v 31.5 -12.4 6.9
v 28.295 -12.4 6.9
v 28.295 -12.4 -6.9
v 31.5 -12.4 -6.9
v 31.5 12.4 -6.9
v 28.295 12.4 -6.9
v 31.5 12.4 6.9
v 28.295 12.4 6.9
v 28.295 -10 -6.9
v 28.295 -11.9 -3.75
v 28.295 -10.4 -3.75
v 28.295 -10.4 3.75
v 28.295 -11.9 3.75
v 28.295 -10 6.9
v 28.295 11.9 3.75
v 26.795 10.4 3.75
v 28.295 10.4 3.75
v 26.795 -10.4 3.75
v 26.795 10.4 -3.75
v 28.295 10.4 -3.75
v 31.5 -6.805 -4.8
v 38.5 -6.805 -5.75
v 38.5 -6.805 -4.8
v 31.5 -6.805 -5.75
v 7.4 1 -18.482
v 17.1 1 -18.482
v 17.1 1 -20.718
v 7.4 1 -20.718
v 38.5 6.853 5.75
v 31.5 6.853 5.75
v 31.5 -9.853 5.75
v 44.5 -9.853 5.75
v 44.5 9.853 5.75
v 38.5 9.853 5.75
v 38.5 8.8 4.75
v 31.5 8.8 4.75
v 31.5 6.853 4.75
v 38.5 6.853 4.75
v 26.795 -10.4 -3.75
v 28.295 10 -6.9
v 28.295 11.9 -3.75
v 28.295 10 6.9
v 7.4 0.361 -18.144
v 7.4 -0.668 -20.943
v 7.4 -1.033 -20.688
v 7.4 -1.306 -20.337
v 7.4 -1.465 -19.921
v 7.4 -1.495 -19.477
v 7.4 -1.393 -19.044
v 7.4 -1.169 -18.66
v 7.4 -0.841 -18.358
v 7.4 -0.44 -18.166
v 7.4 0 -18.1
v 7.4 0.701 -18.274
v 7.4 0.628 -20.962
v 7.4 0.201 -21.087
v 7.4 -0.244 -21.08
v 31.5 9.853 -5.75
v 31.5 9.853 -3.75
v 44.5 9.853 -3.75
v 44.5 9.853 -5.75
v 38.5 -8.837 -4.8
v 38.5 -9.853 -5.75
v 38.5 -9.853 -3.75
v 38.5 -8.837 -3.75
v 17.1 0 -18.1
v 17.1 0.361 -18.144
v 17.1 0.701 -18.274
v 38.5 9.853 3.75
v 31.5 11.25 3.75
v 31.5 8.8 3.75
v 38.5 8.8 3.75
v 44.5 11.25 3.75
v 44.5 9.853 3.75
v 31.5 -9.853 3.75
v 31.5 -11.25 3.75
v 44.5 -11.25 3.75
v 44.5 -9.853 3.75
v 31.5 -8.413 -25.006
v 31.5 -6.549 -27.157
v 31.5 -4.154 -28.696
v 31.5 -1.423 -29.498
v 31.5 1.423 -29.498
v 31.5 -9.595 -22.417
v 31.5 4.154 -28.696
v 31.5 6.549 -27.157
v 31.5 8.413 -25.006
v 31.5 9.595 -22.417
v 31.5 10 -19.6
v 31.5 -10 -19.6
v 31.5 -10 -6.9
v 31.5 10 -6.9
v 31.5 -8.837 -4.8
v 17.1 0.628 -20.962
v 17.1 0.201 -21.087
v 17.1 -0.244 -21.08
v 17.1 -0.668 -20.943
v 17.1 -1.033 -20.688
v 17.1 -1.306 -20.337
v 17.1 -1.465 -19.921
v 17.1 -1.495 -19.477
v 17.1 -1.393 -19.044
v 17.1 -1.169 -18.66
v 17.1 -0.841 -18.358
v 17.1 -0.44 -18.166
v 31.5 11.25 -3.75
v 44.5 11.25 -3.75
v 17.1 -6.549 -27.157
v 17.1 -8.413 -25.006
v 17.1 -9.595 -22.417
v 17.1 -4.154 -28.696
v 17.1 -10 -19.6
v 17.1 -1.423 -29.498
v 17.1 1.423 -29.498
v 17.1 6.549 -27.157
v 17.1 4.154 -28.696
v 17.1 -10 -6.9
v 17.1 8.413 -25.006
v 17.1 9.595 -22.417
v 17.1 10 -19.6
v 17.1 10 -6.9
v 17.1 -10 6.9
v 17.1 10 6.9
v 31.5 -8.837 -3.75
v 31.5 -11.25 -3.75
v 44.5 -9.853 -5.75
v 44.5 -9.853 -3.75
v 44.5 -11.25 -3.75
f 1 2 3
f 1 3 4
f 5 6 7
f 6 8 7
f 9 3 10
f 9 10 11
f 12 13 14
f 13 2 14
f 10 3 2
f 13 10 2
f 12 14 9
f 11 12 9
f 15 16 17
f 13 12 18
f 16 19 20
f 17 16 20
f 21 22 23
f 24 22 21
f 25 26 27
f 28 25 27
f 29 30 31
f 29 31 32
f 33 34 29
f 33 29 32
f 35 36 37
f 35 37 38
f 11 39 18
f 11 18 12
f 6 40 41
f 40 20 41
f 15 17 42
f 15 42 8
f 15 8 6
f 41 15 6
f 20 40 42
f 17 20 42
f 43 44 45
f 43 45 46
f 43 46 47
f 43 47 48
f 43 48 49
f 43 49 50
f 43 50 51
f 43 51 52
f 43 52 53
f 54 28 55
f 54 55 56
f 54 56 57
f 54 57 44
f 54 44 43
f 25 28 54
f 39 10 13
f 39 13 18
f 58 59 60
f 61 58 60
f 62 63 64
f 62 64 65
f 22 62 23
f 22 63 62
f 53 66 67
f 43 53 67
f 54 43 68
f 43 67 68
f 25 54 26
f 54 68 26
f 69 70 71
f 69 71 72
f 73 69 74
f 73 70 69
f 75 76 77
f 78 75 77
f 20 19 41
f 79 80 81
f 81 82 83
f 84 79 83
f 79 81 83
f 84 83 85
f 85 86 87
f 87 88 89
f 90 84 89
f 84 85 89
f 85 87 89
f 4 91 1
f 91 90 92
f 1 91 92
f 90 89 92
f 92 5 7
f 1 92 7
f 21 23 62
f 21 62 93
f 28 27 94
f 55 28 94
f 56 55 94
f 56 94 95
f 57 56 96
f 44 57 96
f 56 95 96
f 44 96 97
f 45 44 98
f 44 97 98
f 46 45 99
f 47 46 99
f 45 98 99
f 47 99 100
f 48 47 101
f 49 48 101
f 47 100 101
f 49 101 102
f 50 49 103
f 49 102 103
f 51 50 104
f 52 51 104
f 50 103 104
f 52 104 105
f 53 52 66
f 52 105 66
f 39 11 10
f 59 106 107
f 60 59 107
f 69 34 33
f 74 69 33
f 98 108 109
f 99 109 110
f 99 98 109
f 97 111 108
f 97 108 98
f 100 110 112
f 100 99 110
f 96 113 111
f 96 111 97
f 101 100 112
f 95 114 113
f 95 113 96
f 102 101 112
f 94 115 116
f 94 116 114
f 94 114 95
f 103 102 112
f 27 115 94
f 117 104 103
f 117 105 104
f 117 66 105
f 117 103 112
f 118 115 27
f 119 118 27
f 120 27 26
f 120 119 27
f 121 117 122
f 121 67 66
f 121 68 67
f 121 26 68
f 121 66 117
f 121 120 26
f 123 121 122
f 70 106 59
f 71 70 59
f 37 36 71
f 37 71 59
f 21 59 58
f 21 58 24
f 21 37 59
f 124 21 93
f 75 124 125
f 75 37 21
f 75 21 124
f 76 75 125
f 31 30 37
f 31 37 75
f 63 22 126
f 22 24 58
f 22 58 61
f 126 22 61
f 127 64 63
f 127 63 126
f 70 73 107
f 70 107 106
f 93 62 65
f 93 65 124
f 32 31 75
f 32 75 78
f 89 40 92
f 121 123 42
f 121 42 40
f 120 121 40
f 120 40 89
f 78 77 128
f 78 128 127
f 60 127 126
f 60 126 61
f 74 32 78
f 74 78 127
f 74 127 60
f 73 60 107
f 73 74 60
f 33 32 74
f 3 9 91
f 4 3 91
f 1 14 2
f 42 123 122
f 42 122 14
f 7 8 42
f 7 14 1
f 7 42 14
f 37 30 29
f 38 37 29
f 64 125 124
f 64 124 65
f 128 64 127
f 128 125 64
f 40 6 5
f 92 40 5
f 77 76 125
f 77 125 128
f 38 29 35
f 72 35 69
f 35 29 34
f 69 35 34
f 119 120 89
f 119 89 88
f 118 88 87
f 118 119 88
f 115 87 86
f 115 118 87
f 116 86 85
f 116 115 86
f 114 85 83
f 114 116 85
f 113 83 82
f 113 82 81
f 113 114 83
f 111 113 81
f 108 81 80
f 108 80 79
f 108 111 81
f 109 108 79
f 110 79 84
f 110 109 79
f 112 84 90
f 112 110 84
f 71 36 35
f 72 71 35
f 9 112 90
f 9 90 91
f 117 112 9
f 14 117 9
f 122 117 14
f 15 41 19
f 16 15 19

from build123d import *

# Parameters (mm, degrees)
SKETCH1_R           = 10
SKETCH1_W           = 31.5
SKETCH1_H           = 20
SKETCH1_W_2         = 3.204542896
SKETCH1_H_2         = 24.8
BOSS_EXTRUDE1_DEPTH = 6.9
BOSS_EXTRUDE2_DEPTH = 5.75
BOSS_EXTRUDE3_DEPTH = 9.7
SKETCH3_W           = 13
SKETCH3_H           = 1.999999936
SKETCH3_H_2         = 2.000000064
CUT_EXTRUDE1_DEPTH  = 1.397
SKETCH4_W           = 7.0000114
SKETCH4_H           = 1.016
CUT_EXTRUDE2_DEPTH  = 2.000000064
SKETCH6_W           = 7
SKETCH6_H           = 1.947
CUT_EXTRUDE4_DEPTH  = 1
SKETCH4_3_W         = 7.0000114
SKETCH4_3_H         = 2.032
CUT_EXTRUDE3_DEPTH  = 0.95
SKETCH6_3_W         = 7
SKETCH6_3_H         = 1.053
CUT_EXTRUDE5_DEPTH  = 1.999999936
BOSS_EXTRUDE4_START = -3.75
BOSS_EXTRUDE4_DEPTH = 7.5
SKETCH9_W           = 36.585233059
SKETCH9_H           = 32.734155895
CUT_EXTRUDE6_DEPTH  = 53.512569924
SKETCH10_R          = 10
BOSS_EXTRUDE5_DEPTH = 14.400000064
BOSS_EXTRUDE6_DEPTH = 9.7


with BuildPart() as part:
    # Sketch1 → Boss-Extrude1 (new, symmetric)
    with BuildSketch(Plane.XY):
        Circle(SKETCH1_R)
        with Locations((15.75, 0)):
            Rectangle(SKETCH1_W, SKETCH1_H)
        with Locations((29.897728552, 0)):
            Rectangle(SKETCH1_W_2, SKETCH1_H_2)
    extrude(amount=BOSS_EXTRUDE1_DEPTH, both=True)

    # Sketch2 → Boss-Extrude3 (add)
    with BuildSketch(Plane.XY.offset(6.9)):
        with BuildLine():
            Line((1.118033989, 1), (-1.118033989, 1))
            ThreePointArc((-1.118033989, 1), (-0.535233135, -1.401258538), (1.5, 0))
            ThreePointArc((1.5, 0), (1.401258538, 0.535233135), (1.118033989, 1))
        make_face()
    extrude(amount=BOSS_EXTRUDE3_DEPTH)

    # Sketch8 → Boss-Extrude4 (add)
    with BuildSketch(Plane.XY.offset(BOSS_EXTRUDE4_START)):
        Polygon((26.795457104, 10.4), (28.295457104, 10.4), (28.295457104, 11.9), align=None)
        Polygon((26.795457104, -10.4), (28.295457104, -10.4), (28.295457104, -11.9), align=None)
    extrude(amount=BOSS_EXTRUDE4_DEPTH)

    # Sketch9 → Cut-Extrude6 (cut, through all)
    with BuildSketch(Plane(origin=(0, 10, 0), x_dir=(1, 0, 0), z_dir=(0, 1, 0))):
        with Locations((-1.192616594, -3.580870026)):
            Rectangle(SKETCH9_W, SKETCH9_H)
    extrude(amount=-CUT_EXTRUDE6_DEPTH, mode=Mode.SUBTRACT)

    # Sketch10 → Boss-Extrude5 (add)
    with BuildSketch(Plane.ZY.offset(-17.099999936)):
        with Locations((-19.6, 0)):
            Circle(SKETCH10_R)
        with BuildLine():
            Line((-6.9, 10), (-19.6, 10))
            ThreePointArc((-19.6, 10), (-12.528932188, 7.071067812), (-9.6, 0))
            ThreePointArc((-9.6, 0), (-12.528932188, -7.071067812), (-19.6, -10))
            Line((-19.6, -10), (-6.9, -10))
            Line((-6.9, -10), (-6.9, 10))
        make_face()
    extrude(amount=-BOSS_EXTRUDE5_DEPTH)

    # Sketch11 → Boss-Extrude6 (add)
    with BuildSketch(Plane.ZY.offset(-17.099999936)):
        with BuildLine():
            Line((-18.481966011, 1), (-20.718033989, 1))
            ThreePointArc((-20.718033989, 1), (-20.135233135, -1.401258538), (-18.1, 0))
            ThreePointArc((-18.1, 0), (-18.198741462, 0.535233135), (-18.481966011, 1))
        make_face()
    extrude(amount=BOSS_EXTRUDE6_DEPTH)


with BuildPart() as body_2:
    # Sketch1<3> → Boss-Extrude2 (new, symmetric)
    with BuildSketch(Plane.XY):
        Polygon((31.5, 11.25), (31.5, 10), (31.5, 0), (44.5, 0), (44.5, 11.25), align=None)
        Polygon((31.5, 0), (31.5, -10), (31.5, -11.25), (44.5, -11.25), (44.5, 0), align=None)
    extrude(amount=BOSS_EXTRUDE2_DEPTH, both=True)

    # Sketch3 → Cut-Extrude1 (cut)
    with BuildSketch(Plane.XZ.offset(11.25)):
        with Locations((38, 4.750000032)):
            Rectangle(SKETCH3_W, SKETCH3_H)
        with Locations((38, -4.749999968)):
            Rectangle(SKETCH3_W, SKETCH3_H_2)
    cut_extrude1 = extrude(amount=-CUT_EXTRUDE1_DEPTH, mode=Mode.SUBTRACT)

    # Mirror1: Cut-Extrude1 across plane
    add(cut_extrude1.mirror(Plane.ZX), mode=Mode.SUBTRACT)

    # Sketch4 → Cut-Extrude2 (cut)
    with BuildSketch(Plane(origin=(0, 0, -5.75), x_dir=(-1, 0, 0), z_dir=(0, 0, -1))):
        with Locations((-35.0000057, -9.345)):
            Rectangle(SKETCH4_W, SKETCH4_H)
    extrude(amount=-CUT_EXTRUDE2_DEPTH, mode=Mode.SUBTRACT)

    # Sketch6 → Cut-Extrude4 (cut)
    with BuildSketch(Plane.XY.offset(5.75)):
        with Locations((35, 7.8265)):
            Rectangle(SKETCH6_W, SKETCH6_H)
    extrude(amount=-CUT_EXTRUDE4_DEPTH, mode=Mode.SUBTRACT)

    # Sketch4<3> → Cut-Extrude3 (cut)
    with BuildSketch(Plane(origin=(0, 0, -5.75), x_dir=(-1, 0, 0), z_dir=(0, 0, -1))):
        with Locations((-35.0000057, -7.821)):
            Rectangle(SKETCH4_3_W, SKETCH4_3_H)
    extrude(amount=-CUT_EXTRUDE3_DEPTH, mode=Mode.SUBTRACT)

    # Sketch6<3> → Cut-Extrude5 (cut)
    with BuildSketch(Plane.XY.offset(5.75)):
        with Locations((35, 9.3265)):
            Rectangle(SKETCH6_3_W, SKETCH6_3_H)
    extrude(amount=-CUT_EXTRUDE5_DEPTH, mode=Mode.SUBTRACT)


solid = Compound([part.part, body_2.part])
